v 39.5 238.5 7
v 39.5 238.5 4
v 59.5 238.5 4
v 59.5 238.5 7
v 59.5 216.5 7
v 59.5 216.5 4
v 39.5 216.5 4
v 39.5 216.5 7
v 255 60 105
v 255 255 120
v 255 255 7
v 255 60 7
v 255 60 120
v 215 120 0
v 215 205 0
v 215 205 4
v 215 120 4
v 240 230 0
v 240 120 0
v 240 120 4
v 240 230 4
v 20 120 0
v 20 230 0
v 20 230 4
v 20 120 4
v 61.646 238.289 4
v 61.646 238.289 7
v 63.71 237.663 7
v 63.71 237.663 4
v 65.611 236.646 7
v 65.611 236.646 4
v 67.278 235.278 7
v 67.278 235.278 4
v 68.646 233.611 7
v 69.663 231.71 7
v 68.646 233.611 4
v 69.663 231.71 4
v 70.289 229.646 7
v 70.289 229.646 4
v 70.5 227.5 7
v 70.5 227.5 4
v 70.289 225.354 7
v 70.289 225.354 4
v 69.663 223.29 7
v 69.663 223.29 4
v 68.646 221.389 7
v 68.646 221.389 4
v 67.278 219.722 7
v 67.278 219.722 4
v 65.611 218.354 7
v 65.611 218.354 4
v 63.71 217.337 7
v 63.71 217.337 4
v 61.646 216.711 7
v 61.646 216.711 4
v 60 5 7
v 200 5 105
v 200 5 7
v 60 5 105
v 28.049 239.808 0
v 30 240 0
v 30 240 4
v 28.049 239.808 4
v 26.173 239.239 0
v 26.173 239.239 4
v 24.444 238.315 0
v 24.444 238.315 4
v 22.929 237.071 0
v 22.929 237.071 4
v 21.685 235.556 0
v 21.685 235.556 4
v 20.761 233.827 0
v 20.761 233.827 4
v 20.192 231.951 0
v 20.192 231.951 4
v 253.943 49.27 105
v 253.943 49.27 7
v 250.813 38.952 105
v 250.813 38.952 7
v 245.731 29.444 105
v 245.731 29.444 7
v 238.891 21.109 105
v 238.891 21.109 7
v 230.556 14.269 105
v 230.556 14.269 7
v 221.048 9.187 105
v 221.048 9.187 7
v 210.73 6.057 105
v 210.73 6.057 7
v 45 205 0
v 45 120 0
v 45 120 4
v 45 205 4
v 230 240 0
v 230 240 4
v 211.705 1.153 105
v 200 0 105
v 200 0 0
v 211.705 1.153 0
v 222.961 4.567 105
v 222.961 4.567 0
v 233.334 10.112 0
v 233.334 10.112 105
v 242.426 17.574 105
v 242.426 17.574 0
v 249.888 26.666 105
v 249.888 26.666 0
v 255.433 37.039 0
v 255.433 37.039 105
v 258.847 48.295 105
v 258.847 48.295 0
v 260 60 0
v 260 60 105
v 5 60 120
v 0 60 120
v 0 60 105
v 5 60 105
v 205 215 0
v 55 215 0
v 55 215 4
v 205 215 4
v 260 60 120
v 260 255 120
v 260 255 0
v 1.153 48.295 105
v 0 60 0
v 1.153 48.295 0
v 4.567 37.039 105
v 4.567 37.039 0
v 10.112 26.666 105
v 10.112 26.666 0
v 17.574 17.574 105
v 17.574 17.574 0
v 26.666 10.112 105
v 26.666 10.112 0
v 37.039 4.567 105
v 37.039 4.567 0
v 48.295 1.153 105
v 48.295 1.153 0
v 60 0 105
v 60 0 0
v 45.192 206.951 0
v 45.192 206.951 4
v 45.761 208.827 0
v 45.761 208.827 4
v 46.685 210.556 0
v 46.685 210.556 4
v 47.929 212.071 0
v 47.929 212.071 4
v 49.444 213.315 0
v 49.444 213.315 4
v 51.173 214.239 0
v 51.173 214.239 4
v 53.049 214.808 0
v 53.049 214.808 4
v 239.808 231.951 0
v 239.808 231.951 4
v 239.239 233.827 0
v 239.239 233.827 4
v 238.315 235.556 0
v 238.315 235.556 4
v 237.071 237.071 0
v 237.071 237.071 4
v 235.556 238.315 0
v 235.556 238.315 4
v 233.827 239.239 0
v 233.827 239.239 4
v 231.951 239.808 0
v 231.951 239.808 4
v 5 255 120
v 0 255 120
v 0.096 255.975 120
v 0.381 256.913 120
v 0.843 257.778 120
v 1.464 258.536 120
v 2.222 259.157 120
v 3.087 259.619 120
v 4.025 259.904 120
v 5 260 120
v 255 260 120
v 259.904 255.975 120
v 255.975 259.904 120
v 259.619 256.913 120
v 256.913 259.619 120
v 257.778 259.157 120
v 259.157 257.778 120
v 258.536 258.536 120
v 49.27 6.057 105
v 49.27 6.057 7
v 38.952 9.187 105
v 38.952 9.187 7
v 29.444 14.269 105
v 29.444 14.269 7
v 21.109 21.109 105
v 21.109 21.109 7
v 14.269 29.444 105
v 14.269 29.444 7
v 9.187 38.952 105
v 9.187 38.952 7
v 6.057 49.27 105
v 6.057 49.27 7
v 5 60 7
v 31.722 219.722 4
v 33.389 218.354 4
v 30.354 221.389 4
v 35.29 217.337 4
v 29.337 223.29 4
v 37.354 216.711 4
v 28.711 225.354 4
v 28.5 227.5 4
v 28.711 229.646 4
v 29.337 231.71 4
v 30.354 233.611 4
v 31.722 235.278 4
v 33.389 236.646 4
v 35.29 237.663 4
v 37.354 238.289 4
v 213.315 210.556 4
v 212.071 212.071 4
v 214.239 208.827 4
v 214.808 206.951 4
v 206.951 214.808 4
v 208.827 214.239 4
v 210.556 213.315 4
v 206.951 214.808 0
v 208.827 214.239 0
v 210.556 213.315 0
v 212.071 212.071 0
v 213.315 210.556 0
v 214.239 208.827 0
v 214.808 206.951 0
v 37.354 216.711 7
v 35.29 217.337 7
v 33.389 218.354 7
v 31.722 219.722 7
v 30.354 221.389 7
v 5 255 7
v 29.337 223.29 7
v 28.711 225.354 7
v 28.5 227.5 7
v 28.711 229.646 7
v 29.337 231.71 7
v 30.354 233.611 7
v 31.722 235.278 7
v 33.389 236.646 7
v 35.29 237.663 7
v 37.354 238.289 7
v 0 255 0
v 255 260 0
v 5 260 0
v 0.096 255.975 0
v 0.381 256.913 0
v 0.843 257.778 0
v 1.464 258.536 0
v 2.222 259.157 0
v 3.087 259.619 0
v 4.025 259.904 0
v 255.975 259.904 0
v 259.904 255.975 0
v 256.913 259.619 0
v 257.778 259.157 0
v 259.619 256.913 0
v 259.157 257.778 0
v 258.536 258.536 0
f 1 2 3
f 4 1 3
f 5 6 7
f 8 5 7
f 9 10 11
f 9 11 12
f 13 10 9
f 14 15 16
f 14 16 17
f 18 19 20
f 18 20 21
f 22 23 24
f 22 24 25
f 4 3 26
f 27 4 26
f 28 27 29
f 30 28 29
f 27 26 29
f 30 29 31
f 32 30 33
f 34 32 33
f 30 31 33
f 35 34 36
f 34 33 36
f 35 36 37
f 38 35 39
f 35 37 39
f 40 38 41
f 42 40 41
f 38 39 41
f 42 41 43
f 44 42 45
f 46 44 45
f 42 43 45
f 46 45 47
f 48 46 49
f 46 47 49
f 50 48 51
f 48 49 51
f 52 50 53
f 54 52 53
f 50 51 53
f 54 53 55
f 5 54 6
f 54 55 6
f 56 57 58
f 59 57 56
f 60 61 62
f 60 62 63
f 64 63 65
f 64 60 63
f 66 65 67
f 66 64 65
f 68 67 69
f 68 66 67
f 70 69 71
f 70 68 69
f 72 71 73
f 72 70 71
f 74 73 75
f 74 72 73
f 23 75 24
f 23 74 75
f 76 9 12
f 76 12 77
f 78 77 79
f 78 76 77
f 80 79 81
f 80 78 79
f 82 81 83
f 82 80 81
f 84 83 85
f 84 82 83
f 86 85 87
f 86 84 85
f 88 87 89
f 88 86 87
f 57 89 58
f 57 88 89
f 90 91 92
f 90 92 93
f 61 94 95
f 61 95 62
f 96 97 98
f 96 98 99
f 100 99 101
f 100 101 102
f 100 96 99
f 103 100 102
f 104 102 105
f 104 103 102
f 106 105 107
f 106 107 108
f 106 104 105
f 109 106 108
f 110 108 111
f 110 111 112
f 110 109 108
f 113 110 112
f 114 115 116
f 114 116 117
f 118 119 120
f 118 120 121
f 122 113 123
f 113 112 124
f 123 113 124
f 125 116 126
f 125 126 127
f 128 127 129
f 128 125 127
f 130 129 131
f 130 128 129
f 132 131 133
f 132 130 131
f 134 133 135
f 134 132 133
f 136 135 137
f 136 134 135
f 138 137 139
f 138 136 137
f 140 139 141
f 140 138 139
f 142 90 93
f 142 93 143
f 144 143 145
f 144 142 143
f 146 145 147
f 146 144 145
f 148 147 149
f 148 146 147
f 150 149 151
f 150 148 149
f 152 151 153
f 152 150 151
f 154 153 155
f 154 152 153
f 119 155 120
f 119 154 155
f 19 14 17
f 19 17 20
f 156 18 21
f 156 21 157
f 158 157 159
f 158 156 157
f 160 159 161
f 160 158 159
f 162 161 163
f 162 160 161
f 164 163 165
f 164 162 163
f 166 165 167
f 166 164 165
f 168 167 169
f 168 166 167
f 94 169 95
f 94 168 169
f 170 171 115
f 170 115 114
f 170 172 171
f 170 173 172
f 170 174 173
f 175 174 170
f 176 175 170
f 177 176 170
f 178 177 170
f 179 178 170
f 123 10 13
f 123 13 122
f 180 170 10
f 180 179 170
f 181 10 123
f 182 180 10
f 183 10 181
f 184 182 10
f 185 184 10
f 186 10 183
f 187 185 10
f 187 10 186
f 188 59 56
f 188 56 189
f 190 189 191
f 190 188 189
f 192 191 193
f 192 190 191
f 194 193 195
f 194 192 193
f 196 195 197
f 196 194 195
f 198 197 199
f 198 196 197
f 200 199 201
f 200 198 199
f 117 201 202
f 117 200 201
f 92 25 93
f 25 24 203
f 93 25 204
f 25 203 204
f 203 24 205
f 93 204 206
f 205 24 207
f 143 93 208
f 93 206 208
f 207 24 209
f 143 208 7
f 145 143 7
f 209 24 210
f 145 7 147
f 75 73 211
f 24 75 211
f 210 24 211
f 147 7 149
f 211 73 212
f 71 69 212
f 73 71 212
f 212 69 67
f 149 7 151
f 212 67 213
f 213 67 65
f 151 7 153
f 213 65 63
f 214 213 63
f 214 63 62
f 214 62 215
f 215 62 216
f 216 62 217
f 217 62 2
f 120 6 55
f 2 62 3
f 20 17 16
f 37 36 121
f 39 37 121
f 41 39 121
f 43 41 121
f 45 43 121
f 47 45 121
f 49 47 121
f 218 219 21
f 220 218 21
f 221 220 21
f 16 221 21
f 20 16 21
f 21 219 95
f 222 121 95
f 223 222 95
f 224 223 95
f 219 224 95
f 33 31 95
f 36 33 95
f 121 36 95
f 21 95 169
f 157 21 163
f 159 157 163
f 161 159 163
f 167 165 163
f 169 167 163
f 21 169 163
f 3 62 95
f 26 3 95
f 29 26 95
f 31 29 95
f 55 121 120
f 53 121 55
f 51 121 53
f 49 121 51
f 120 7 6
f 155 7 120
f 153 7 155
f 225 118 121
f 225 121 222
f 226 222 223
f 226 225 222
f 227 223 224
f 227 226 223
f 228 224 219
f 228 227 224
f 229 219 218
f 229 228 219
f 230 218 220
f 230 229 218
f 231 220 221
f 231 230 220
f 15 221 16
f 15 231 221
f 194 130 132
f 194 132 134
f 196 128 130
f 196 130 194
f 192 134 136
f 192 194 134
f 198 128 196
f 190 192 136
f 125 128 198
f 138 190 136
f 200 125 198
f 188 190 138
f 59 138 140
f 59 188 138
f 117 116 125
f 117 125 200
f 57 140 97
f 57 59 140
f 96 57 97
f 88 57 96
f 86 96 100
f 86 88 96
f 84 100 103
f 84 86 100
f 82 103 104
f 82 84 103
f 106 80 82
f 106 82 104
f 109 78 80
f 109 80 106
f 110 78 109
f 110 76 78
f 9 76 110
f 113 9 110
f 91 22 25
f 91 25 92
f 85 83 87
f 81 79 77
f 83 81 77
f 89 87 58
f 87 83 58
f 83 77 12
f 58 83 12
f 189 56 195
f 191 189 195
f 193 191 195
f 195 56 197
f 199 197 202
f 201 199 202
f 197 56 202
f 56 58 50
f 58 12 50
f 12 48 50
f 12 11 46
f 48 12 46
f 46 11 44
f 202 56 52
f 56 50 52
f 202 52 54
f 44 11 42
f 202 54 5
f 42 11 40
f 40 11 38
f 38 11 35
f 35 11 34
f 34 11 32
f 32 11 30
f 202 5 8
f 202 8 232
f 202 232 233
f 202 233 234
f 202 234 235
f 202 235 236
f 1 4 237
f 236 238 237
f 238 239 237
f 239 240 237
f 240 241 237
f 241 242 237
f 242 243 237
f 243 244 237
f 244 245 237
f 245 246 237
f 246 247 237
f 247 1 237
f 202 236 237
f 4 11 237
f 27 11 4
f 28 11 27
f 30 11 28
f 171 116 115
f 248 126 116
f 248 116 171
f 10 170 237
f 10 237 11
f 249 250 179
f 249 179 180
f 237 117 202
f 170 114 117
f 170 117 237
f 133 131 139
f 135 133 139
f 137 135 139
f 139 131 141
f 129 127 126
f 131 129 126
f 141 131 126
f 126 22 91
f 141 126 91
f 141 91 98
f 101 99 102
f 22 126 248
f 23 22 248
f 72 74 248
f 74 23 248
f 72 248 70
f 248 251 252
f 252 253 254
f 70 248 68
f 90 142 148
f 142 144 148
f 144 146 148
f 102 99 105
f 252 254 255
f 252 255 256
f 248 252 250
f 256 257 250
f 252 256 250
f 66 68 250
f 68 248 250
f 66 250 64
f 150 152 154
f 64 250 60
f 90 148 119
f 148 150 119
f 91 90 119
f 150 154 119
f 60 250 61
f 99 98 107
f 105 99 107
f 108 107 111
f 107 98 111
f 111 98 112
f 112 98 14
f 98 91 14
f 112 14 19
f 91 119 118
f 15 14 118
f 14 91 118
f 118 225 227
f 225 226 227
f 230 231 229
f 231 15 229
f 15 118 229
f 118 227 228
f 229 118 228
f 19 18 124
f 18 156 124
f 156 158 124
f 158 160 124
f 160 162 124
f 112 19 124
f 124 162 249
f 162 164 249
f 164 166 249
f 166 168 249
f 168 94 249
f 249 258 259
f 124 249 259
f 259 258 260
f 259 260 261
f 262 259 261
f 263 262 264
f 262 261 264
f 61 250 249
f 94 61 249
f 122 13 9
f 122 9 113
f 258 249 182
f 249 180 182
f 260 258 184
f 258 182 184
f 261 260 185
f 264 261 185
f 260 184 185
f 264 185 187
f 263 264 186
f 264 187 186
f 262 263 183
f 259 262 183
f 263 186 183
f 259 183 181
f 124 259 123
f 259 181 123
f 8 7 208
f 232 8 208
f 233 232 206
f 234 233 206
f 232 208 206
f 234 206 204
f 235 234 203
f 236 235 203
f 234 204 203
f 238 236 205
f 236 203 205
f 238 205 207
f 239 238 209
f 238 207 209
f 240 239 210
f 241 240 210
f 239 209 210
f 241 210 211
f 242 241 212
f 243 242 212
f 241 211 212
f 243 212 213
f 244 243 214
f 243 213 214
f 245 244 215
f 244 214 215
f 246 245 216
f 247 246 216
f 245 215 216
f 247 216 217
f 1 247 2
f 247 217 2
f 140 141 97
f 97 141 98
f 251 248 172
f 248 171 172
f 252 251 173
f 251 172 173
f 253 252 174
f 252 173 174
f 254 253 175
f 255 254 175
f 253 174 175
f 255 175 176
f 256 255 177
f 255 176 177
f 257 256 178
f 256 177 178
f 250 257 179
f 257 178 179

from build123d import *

# Parameters (mm, degrees)
ESQUISSE2_W             = 260
ESQUISSE2_H             = 260
BOSS_EXTRU_1_DEPTH      = 120
CONG_1_R                = 60
CONG_2_R                = 5
ENL_V_MAT_EXTRU_1_DEPTH = 113
ESQUISSE4_W             = 260
ESQUISSE4_H             = 60
ENL_V_MAT_EXTRU_2_DEPTH = 15
ENL_V_MAT_EXTRU_3_DEPTH = 4
ENL_V_MAT_EXTRU_4_DEPTH = 10


with BuildPart() as part:
    # Esquisse2 → Boss.-Extru.1 (new body)
    with BuildSketch(Plane.XY):
        with Locations((130, 130)):
            Rectangle(ESQUISSE2_W, ESQUISSE2_H)
    extrude(amount=BOSS_EXTRU_1_DEPTH)

    # Congé1
    cong_1_edges = [part.edges().sort_by_distance(p)[0] for p in [
        (260, 0, 60),
        (0, 0, 60),
    ]]
    fillet(cong_1_edges, radius=CONG_1_R)

    # Congé2
    cong_2_edges = [part.edges().sort_by_distance(p)[0] for p in [
        (0, 260, 60),
        (260, 260, 60),
    ]]
    fillet(cong_2_edges, radius=CONG_2_R)

    # Esquisse3 → Enlèv. mat.-Extru.1 (cut)
    with BuildSketch(Plane.XY.offset(120)):
        with BuildLine():
            Line((5, 255), (255, 255))
            Line((255, 255), (255, 60))
            ThreePointArc((255, 60), (238.890872965, 21.109127035), (200, 5))
            Line((200, 5), (60, 5))
            ThreePointArc((60, 5), (21.109127035, 21.109127035), (5, 60))
            Line((5, 60), (5, 255))
        make_face()
    extrude(amount=-ENL_V_MAT_EXTRU_1_DEPTH, mode=Mode.SUBTRACT)

    # Esquisse4 → Enlèv. mat.-Extru.2 (cut)
    with BuildSketch(Plane.XY.offset(120)):
        with Locations((130, 30)):
            Rectangle(ESQUISSE4_W, ESQUISSE4_H)
    extrude(amount=-ENL_V_MAT_EXTRU_2_DEPTH, mode=Mode.SUBTRACT)

    # Esquisse5 → Enlèv. mat.-Extru.3 (cut)
    with BuildSketch(Plane(origin=(0, 0, 0), x_dir=(-1, 0, 0), z_dir=(0, 0, -1))):
        with BuildLine():
            Line((-240, 120), (-240, 230))
            ThreePointArc((-240, 230), (-237.071067812, 237.071067812), (-230, 240))
            Line((-230, 240), (-30, 240))
            ThreePointArc((-30, 240), (-22.928932188, 237.071067812), (-20, 230))
            Line((-20, 230), (-20, 120))
            Line((-20, 120), (-45, 120))
            Line((-45, 120), (-45, 205))
            ThreePointArc((-45, 205), (-47.928932188, 212.071067812), (-55, 215))
            Line((-55, 215), (-205, 215))
            ThreePointArc((-205, 215), (-212.071067812, 212.071067812), (-215, 205))
            Line((-215, 205), (-215, 120))
            Line((-215, 120), (-240, 120))
        make_face()
    extrude(amount=-ENL_V_MAT_EXTRU_3_DEPTH, mode=Mode.SUBTRACT)

    # Esquisse6 → Enlèv. mat.-Extru.4 (cut)
    with BuildSketch(Plane(origin=(0, 0, 4), x_dir=(-1, 0, 0), z_dir=(0, 0, -1))):
        with BuildLine():
            Line((-39.5, 238.5), (-59.5, 238.5))
            ThreePointArc((-59.5, 238.5), (-70.5, 227.5), (-59.5, 216.5))
            Line((-59.5, 216.5), (-39.5, 216.5))
            ThreePointArc((-39.5, 216.5), (-28.5, 227.5), (-39.5, 238.5))
        make_face()
    extrude(amount=-ENL_V_MAT_EXTRU_4_DEPTH, mode=Mode.SUBTRACT)


solid = part.part
